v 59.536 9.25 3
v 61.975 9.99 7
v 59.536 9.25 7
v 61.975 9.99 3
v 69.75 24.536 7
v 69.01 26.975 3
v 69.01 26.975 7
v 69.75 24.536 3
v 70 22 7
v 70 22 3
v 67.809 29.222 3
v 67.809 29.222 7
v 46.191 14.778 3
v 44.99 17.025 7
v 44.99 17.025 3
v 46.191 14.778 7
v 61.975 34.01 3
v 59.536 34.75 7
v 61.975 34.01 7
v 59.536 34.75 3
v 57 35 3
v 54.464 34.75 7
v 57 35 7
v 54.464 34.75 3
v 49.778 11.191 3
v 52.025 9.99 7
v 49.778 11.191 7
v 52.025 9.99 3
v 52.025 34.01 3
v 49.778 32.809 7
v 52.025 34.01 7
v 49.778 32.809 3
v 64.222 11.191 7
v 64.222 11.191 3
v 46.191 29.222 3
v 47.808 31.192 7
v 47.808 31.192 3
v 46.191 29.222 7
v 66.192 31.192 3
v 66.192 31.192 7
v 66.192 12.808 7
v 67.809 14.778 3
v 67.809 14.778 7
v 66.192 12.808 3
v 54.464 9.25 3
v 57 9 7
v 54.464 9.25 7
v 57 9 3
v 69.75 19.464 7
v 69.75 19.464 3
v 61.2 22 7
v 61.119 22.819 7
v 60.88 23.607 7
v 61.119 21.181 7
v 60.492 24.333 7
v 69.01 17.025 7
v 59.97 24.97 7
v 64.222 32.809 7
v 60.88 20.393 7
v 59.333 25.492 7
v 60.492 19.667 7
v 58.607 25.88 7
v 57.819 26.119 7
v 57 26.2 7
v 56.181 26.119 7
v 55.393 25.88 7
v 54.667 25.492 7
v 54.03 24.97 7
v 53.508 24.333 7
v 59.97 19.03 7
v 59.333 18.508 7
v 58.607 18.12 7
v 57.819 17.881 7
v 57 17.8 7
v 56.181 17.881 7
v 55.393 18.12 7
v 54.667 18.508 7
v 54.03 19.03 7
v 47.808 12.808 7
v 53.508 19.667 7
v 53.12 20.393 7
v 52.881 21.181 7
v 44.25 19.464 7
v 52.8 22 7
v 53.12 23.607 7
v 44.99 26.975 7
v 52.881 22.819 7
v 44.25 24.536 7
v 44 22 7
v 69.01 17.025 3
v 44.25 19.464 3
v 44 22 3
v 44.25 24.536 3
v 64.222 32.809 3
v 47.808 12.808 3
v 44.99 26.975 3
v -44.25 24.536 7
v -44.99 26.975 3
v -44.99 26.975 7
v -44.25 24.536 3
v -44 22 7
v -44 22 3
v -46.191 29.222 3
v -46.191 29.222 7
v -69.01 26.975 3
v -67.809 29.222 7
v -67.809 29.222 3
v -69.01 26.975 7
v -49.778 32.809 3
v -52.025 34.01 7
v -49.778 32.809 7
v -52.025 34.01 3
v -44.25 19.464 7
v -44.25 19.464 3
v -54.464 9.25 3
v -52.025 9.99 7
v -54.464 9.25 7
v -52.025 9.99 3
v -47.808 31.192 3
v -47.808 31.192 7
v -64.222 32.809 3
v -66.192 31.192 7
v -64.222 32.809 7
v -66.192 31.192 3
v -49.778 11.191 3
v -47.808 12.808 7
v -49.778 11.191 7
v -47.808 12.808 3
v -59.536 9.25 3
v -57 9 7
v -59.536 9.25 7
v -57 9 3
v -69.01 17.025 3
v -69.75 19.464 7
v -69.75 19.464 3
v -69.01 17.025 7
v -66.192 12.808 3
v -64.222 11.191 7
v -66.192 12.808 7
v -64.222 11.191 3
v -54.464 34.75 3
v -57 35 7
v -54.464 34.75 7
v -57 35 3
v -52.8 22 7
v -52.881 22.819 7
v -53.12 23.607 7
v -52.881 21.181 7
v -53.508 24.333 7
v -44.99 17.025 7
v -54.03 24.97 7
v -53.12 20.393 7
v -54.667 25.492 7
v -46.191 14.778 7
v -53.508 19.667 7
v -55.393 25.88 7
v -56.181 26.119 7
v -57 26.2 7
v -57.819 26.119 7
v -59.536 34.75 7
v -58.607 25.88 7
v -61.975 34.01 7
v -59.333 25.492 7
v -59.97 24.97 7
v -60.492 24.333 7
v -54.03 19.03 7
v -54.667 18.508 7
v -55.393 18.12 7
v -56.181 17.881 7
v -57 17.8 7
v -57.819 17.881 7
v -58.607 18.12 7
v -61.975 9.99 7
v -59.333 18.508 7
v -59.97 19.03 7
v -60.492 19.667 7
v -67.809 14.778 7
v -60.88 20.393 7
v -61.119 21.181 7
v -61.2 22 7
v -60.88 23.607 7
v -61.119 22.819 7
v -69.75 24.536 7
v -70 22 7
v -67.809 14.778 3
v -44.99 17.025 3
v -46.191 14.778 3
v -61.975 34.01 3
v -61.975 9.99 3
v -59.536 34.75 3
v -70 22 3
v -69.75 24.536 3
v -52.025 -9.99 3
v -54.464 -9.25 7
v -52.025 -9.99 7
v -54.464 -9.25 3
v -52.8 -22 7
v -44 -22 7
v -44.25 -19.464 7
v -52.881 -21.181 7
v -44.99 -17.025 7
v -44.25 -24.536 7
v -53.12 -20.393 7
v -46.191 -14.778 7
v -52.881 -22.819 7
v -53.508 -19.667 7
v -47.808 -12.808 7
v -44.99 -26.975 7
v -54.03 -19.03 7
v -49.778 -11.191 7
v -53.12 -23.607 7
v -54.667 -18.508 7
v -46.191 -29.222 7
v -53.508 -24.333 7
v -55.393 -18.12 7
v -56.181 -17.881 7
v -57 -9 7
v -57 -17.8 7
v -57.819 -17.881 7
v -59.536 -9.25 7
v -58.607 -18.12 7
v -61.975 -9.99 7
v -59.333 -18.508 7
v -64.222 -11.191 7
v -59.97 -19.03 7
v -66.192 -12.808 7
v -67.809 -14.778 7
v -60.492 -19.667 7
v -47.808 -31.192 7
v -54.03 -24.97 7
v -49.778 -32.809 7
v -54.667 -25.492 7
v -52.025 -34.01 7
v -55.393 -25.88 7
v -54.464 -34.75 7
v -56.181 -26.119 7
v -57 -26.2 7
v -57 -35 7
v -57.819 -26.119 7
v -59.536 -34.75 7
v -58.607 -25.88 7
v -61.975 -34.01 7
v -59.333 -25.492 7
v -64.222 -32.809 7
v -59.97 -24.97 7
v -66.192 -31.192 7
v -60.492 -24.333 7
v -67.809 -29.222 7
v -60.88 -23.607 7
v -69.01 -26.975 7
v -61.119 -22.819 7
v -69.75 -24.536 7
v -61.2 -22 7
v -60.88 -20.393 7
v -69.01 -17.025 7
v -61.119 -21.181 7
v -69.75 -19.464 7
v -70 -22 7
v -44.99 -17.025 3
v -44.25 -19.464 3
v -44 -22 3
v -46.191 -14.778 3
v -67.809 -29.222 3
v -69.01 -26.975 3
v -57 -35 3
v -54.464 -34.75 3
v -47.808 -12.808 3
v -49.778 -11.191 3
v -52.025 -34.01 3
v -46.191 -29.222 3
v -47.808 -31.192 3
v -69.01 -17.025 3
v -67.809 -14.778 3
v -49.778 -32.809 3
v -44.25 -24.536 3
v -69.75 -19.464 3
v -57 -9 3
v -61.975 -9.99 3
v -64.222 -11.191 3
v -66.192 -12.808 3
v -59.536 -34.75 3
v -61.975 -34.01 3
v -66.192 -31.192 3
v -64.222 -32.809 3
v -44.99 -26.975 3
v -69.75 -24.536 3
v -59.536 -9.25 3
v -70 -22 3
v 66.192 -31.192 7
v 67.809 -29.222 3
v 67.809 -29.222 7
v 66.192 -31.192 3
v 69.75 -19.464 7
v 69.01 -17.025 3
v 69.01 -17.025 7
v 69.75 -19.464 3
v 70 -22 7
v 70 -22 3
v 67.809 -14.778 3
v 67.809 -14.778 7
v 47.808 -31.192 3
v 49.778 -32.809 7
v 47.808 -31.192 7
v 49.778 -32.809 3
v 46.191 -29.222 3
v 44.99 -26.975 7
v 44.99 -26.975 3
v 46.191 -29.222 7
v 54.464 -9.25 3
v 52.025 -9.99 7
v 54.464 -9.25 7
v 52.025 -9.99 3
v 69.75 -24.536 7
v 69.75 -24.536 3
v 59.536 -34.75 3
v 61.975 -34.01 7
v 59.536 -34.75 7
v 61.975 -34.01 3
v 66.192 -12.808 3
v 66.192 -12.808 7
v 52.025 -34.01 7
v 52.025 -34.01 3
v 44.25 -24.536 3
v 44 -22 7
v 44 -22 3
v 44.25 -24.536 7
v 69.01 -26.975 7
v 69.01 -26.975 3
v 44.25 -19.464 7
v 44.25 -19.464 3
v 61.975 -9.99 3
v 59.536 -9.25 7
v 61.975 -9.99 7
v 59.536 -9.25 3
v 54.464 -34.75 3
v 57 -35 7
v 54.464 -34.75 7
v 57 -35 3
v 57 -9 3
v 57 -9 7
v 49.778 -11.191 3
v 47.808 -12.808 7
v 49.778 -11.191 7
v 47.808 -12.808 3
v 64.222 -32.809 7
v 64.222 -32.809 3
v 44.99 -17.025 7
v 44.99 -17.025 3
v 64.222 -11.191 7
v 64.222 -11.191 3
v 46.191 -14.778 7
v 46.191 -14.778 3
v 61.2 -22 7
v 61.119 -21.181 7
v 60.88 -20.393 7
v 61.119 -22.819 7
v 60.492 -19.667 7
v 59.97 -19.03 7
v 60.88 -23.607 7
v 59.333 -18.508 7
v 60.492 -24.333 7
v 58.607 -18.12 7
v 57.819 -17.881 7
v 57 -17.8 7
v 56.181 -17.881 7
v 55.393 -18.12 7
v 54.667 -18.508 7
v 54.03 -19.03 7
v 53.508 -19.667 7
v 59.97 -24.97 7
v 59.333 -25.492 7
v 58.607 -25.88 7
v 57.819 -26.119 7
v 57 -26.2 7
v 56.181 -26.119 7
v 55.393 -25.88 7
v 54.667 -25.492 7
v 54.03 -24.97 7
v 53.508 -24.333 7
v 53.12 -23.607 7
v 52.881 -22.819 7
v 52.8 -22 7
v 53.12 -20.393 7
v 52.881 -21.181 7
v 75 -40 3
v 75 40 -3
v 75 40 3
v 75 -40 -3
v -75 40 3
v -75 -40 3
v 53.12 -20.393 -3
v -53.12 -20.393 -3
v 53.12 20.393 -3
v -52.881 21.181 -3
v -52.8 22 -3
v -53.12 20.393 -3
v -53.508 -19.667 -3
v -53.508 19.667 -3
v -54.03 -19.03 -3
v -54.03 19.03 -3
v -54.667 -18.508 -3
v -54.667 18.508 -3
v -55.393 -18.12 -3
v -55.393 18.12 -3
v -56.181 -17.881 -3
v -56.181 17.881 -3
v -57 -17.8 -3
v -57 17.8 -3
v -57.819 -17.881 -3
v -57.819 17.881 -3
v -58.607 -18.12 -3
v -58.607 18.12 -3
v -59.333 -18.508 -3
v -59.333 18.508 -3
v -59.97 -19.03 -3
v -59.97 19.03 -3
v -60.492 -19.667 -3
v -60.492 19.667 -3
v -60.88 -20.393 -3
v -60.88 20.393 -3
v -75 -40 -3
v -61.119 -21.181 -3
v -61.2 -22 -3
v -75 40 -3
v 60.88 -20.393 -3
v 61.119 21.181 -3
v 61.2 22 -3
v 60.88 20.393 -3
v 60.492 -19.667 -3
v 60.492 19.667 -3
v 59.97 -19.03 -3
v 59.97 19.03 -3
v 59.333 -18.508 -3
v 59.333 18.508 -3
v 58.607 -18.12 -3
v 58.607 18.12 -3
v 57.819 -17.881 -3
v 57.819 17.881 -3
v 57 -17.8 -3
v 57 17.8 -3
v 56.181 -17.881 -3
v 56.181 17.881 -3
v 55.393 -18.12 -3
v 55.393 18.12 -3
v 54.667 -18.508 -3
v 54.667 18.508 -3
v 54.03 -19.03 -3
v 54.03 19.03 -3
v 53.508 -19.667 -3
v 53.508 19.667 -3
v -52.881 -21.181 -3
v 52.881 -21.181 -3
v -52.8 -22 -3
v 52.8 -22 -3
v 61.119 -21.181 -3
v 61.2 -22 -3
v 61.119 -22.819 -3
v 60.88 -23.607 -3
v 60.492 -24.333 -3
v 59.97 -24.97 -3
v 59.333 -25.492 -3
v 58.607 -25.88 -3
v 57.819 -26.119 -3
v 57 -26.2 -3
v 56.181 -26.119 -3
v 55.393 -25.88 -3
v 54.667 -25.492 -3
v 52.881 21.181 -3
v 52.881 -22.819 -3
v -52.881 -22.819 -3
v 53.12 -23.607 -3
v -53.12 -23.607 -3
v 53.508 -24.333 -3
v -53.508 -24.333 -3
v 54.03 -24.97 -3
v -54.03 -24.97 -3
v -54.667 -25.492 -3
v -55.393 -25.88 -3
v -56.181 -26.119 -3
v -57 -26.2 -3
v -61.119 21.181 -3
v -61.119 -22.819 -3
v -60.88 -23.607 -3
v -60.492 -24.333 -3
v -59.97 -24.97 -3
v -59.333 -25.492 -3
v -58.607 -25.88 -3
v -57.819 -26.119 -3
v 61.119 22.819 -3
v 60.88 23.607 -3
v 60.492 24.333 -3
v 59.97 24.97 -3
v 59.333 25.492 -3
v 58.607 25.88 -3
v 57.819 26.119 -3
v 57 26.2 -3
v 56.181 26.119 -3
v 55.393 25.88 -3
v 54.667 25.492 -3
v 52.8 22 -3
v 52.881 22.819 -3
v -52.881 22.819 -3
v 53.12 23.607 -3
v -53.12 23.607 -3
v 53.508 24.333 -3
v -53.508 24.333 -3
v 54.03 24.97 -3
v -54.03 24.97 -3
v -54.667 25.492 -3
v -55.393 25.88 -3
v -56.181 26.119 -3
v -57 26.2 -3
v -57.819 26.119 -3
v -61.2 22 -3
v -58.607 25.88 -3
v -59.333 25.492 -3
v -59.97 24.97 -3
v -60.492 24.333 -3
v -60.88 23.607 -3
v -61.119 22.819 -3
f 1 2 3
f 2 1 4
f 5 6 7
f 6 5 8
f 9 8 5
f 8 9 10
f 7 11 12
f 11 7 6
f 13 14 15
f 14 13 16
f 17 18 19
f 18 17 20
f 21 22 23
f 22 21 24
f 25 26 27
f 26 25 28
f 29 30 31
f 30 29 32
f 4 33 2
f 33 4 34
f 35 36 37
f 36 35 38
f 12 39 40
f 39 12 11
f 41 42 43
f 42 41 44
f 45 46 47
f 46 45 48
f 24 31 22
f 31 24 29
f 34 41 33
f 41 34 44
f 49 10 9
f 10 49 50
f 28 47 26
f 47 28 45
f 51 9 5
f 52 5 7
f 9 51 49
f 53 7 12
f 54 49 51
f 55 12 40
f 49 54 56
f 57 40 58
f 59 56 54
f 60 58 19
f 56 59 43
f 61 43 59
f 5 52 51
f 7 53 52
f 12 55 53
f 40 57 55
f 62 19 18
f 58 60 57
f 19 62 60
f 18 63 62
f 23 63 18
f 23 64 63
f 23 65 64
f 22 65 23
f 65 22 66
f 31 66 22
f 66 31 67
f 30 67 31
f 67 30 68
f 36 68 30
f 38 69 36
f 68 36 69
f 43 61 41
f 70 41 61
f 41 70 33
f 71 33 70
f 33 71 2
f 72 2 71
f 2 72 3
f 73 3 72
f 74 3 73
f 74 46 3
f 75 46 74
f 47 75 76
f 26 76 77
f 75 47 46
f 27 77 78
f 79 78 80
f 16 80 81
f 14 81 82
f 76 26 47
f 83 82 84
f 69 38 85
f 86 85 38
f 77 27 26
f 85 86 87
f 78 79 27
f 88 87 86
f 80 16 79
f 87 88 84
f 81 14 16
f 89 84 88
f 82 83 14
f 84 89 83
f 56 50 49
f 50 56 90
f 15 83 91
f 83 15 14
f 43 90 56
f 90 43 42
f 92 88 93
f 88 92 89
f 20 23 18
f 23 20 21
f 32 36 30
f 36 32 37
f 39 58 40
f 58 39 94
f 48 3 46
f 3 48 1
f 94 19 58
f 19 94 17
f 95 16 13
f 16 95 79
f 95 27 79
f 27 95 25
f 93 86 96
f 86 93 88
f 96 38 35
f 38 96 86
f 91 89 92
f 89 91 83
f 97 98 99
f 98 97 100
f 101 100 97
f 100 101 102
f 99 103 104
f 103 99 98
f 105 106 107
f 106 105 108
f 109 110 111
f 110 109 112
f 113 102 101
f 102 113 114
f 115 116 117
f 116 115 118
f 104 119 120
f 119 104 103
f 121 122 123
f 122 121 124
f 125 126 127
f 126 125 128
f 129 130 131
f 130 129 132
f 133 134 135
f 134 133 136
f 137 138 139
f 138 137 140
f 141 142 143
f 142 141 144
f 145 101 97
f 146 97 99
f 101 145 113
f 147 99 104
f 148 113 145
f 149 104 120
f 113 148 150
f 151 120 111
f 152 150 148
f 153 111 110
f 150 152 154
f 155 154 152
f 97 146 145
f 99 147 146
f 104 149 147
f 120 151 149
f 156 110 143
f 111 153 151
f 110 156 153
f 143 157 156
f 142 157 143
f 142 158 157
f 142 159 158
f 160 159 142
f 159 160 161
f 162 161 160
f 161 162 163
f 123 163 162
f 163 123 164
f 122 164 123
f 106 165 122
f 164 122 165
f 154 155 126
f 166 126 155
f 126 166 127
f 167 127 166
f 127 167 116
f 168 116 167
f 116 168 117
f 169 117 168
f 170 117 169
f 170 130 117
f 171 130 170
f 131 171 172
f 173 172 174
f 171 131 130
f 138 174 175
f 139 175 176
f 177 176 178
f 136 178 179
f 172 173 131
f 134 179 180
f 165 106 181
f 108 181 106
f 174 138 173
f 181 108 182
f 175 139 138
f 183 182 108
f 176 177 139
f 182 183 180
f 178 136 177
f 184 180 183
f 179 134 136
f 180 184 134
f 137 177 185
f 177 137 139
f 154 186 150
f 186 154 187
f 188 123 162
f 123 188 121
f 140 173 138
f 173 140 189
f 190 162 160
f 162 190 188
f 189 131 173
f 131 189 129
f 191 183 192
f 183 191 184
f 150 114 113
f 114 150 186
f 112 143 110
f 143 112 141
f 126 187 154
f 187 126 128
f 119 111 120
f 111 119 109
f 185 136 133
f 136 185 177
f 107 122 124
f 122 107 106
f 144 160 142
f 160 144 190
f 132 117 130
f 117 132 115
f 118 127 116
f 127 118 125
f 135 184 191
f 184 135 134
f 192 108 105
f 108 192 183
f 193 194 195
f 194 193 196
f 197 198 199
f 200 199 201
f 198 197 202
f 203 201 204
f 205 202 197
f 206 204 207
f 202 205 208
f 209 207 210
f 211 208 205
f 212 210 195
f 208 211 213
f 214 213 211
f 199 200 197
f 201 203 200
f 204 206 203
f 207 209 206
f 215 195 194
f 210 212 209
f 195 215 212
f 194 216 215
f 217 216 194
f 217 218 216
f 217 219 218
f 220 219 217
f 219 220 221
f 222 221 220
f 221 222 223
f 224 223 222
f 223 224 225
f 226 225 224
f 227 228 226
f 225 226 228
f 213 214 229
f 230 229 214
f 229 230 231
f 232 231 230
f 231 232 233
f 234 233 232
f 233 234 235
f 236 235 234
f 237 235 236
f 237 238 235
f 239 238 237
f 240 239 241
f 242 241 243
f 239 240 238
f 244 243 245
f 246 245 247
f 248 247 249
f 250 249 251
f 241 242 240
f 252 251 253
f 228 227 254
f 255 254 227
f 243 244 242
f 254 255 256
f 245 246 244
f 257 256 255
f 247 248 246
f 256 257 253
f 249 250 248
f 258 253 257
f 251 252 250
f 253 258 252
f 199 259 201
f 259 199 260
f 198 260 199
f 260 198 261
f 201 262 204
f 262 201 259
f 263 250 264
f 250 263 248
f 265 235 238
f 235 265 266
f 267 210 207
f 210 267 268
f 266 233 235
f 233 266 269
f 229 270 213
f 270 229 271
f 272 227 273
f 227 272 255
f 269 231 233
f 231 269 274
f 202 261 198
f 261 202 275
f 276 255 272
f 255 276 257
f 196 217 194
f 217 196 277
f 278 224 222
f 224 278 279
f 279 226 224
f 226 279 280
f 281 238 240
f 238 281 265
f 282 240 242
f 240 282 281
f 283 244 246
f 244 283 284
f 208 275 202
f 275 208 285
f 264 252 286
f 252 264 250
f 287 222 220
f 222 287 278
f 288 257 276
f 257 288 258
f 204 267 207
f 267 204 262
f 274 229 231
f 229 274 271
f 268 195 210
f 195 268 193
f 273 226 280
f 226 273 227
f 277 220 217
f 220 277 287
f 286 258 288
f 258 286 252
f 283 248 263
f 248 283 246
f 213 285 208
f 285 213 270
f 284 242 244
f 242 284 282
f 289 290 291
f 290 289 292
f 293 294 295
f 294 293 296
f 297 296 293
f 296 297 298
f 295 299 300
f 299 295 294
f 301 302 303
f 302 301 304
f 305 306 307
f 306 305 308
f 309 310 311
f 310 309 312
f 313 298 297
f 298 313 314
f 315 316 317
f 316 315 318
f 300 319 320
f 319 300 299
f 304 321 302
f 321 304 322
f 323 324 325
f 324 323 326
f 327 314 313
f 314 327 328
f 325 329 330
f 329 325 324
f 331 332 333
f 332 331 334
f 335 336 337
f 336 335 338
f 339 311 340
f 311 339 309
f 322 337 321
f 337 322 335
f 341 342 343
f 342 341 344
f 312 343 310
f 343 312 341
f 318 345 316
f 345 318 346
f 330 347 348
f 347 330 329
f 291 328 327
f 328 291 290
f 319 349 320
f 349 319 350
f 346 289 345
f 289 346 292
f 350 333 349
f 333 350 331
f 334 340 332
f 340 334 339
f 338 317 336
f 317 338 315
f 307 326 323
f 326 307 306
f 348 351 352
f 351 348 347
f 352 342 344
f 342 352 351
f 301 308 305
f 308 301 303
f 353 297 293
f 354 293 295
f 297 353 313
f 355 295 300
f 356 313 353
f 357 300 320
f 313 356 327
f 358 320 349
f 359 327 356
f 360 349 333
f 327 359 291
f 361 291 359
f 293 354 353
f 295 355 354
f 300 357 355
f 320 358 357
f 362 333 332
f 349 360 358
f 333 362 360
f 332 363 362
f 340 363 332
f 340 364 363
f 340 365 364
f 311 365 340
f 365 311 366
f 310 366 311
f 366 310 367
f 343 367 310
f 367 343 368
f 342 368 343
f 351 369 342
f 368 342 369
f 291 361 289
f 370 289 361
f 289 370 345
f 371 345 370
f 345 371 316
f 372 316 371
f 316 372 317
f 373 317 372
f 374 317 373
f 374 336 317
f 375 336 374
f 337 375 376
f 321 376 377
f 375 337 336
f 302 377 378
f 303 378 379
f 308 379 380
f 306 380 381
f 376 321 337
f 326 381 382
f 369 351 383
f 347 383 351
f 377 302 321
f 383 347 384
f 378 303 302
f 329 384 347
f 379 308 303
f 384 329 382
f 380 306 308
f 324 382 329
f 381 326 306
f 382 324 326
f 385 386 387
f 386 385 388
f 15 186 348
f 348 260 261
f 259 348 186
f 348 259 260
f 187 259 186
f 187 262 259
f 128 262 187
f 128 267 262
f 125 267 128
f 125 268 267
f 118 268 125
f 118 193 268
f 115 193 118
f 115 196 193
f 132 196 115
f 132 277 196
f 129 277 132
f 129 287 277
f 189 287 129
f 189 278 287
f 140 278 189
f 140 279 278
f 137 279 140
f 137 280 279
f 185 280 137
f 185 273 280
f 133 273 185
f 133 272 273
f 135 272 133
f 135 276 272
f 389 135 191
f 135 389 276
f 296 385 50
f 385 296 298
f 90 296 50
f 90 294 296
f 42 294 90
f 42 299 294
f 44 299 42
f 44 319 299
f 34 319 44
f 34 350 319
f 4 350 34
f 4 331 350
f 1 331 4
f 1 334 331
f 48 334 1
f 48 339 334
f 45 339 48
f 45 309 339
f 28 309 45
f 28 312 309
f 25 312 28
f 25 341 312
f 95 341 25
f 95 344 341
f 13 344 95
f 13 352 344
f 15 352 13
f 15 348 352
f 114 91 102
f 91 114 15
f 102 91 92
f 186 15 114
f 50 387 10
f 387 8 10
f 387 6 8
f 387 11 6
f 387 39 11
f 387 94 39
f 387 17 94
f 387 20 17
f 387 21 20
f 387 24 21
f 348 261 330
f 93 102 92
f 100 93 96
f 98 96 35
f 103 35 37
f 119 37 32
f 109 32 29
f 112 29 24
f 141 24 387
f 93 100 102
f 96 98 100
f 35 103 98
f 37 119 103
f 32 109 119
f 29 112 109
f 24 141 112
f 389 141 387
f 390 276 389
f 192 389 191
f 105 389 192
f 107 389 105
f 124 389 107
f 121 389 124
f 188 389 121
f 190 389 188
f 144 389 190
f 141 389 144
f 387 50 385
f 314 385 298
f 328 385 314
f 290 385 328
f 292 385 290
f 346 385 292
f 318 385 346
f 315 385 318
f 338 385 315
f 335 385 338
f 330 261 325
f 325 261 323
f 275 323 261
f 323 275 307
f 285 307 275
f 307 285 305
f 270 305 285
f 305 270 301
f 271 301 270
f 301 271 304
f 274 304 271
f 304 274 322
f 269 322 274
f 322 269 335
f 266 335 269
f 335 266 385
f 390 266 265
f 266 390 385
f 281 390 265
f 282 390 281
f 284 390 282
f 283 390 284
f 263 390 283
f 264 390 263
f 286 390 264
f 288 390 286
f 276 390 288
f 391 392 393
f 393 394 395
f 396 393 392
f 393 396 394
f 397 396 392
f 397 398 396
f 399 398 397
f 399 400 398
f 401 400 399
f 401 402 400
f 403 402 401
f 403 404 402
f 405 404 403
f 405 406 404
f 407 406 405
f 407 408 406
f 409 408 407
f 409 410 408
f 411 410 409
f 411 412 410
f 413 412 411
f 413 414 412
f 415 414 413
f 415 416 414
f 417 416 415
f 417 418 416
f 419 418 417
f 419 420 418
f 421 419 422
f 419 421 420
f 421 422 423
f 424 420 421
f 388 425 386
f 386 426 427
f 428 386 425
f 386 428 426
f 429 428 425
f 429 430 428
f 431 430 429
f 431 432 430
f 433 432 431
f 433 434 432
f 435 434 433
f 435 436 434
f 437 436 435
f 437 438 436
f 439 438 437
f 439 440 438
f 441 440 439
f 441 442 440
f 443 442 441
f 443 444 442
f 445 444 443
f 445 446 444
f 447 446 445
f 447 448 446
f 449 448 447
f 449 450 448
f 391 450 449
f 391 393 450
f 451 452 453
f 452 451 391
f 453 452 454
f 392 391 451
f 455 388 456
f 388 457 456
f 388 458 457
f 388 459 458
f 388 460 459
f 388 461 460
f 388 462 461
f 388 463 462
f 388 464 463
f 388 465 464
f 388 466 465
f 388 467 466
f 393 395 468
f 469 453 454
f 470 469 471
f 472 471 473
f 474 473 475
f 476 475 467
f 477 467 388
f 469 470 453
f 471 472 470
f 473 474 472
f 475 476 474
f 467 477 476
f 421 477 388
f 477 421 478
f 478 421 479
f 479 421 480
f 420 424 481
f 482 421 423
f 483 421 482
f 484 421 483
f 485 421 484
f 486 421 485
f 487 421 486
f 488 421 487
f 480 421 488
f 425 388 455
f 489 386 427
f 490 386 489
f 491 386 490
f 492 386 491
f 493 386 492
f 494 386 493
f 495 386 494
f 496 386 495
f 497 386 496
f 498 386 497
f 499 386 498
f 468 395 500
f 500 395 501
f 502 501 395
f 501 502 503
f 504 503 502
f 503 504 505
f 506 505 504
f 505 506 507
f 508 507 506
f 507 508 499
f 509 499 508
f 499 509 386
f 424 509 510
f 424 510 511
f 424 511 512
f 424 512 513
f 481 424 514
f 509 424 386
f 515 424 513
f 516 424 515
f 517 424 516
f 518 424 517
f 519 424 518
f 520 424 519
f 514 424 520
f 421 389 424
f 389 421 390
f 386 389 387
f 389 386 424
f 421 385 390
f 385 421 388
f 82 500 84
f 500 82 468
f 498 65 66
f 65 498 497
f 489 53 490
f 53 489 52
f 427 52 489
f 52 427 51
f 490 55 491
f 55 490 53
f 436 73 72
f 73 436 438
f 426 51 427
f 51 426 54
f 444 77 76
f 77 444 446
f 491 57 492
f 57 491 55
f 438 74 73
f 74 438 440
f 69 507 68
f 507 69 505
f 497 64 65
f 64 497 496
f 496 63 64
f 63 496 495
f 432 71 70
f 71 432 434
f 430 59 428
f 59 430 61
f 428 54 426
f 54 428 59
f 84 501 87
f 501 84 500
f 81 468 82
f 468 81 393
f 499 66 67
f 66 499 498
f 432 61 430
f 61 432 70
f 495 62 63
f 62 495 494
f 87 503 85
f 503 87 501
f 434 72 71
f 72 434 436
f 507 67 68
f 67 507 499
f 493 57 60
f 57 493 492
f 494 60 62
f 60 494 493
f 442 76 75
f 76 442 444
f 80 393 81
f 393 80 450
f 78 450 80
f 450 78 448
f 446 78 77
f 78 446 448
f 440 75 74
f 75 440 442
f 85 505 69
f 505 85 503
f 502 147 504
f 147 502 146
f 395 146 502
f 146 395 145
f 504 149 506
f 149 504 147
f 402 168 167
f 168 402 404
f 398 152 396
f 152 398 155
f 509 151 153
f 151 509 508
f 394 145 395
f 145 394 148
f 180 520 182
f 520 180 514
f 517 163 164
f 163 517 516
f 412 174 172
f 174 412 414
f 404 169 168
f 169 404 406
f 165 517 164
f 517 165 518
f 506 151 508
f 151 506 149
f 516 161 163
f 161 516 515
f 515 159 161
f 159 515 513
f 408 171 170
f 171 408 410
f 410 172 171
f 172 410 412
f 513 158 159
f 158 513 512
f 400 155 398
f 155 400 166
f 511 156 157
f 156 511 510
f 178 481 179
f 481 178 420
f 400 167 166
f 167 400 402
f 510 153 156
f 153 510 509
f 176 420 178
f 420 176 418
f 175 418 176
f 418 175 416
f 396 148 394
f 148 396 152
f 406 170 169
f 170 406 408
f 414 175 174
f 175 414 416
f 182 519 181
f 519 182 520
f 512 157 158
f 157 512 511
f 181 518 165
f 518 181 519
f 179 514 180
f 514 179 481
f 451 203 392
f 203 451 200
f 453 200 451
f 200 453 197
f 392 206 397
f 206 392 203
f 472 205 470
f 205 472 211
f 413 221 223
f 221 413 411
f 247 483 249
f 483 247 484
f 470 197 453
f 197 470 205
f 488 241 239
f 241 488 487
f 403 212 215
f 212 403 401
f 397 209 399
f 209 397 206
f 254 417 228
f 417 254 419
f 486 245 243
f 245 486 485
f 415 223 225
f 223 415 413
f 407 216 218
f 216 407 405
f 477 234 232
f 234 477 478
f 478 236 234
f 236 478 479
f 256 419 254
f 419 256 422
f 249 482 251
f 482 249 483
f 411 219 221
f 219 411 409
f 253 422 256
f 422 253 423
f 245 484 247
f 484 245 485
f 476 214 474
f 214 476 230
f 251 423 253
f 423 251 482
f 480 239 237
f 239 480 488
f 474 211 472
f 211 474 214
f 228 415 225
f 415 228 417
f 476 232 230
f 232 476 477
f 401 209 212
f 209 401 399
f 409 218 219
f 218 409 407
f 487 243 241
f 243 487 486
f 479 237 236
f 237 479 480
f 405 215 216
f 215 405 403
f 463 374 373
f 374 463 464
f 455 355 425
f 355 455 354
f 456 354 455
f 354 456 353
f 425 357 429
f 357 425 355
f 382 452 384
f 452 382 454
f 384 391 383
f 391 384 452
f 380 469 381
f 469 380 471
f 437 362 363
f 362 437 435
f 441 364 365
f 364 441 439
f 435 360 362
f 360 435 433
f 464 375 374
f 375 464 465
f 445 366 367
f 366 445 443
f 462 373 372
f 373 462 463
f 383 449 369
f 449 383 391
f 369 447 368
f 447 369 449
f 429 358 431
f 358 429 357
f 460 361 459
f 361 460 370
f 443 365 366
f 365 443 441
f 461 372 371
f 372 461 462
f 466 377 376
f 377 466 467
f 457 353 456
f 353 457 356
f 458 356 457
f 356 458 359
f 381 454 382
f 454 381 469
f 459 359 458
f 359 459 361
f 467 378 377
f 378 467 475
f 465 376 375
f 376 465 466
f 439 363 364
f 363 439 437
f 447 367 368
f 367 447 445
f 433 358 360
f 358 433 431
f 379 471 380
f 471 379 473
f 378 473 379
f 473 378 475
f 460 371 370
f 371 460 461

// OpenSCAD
$fn = 32;

// ----------------------------------------------------------------------
// Anchor pads 150 x 80 x 10
// four corner bosses with anchor holes
// ----------------------------------------------------------------------

// --- parameters (mm) ---
plate = [150, 80, 6];  // base plate size (x, y, z)
pads = 4;              // boss count, one per corner
edge = 18;             // boss centre offset from the plate edge
boss_d = 26;           // boss diameter
boss_h = 4;            // boss height above the base plate
hole_d = 8.4;          // hole diameter

// --- derived feature positions (mm) ---
height = plate[2] + boss_h;      // = 10   overall height of the part
corner_x = plate[0] / 2 - edge;  // = 57   boss centre X
corner_y = plate[1] / 2 - edge;  // = 22   boss centre Y
feature_centers = [
  [corner_x, corner_y],
  [-corner_x, corner_y],
  [-corner_x, -corner_y],
  [corner_x, -corner_y]
];   // boss centres, anchor holes are drilled there

// base plate, four bosses standing on it, anchor holes all the way through
difference() {
  union() {
    cube(plate, center = true);
    for (centre = feature_centers)
      translate([centre[0], centre[1], plate[2] / 2 - 1])
        cylinder(d = boss_d, h = boss_h + 1);
  }
  for (centre = feature_centers)
    translate([centre[0], centre[1], -height])
      cylinder(d = hole_d, h = 2 * height + 2);  // through boss and plate
}
